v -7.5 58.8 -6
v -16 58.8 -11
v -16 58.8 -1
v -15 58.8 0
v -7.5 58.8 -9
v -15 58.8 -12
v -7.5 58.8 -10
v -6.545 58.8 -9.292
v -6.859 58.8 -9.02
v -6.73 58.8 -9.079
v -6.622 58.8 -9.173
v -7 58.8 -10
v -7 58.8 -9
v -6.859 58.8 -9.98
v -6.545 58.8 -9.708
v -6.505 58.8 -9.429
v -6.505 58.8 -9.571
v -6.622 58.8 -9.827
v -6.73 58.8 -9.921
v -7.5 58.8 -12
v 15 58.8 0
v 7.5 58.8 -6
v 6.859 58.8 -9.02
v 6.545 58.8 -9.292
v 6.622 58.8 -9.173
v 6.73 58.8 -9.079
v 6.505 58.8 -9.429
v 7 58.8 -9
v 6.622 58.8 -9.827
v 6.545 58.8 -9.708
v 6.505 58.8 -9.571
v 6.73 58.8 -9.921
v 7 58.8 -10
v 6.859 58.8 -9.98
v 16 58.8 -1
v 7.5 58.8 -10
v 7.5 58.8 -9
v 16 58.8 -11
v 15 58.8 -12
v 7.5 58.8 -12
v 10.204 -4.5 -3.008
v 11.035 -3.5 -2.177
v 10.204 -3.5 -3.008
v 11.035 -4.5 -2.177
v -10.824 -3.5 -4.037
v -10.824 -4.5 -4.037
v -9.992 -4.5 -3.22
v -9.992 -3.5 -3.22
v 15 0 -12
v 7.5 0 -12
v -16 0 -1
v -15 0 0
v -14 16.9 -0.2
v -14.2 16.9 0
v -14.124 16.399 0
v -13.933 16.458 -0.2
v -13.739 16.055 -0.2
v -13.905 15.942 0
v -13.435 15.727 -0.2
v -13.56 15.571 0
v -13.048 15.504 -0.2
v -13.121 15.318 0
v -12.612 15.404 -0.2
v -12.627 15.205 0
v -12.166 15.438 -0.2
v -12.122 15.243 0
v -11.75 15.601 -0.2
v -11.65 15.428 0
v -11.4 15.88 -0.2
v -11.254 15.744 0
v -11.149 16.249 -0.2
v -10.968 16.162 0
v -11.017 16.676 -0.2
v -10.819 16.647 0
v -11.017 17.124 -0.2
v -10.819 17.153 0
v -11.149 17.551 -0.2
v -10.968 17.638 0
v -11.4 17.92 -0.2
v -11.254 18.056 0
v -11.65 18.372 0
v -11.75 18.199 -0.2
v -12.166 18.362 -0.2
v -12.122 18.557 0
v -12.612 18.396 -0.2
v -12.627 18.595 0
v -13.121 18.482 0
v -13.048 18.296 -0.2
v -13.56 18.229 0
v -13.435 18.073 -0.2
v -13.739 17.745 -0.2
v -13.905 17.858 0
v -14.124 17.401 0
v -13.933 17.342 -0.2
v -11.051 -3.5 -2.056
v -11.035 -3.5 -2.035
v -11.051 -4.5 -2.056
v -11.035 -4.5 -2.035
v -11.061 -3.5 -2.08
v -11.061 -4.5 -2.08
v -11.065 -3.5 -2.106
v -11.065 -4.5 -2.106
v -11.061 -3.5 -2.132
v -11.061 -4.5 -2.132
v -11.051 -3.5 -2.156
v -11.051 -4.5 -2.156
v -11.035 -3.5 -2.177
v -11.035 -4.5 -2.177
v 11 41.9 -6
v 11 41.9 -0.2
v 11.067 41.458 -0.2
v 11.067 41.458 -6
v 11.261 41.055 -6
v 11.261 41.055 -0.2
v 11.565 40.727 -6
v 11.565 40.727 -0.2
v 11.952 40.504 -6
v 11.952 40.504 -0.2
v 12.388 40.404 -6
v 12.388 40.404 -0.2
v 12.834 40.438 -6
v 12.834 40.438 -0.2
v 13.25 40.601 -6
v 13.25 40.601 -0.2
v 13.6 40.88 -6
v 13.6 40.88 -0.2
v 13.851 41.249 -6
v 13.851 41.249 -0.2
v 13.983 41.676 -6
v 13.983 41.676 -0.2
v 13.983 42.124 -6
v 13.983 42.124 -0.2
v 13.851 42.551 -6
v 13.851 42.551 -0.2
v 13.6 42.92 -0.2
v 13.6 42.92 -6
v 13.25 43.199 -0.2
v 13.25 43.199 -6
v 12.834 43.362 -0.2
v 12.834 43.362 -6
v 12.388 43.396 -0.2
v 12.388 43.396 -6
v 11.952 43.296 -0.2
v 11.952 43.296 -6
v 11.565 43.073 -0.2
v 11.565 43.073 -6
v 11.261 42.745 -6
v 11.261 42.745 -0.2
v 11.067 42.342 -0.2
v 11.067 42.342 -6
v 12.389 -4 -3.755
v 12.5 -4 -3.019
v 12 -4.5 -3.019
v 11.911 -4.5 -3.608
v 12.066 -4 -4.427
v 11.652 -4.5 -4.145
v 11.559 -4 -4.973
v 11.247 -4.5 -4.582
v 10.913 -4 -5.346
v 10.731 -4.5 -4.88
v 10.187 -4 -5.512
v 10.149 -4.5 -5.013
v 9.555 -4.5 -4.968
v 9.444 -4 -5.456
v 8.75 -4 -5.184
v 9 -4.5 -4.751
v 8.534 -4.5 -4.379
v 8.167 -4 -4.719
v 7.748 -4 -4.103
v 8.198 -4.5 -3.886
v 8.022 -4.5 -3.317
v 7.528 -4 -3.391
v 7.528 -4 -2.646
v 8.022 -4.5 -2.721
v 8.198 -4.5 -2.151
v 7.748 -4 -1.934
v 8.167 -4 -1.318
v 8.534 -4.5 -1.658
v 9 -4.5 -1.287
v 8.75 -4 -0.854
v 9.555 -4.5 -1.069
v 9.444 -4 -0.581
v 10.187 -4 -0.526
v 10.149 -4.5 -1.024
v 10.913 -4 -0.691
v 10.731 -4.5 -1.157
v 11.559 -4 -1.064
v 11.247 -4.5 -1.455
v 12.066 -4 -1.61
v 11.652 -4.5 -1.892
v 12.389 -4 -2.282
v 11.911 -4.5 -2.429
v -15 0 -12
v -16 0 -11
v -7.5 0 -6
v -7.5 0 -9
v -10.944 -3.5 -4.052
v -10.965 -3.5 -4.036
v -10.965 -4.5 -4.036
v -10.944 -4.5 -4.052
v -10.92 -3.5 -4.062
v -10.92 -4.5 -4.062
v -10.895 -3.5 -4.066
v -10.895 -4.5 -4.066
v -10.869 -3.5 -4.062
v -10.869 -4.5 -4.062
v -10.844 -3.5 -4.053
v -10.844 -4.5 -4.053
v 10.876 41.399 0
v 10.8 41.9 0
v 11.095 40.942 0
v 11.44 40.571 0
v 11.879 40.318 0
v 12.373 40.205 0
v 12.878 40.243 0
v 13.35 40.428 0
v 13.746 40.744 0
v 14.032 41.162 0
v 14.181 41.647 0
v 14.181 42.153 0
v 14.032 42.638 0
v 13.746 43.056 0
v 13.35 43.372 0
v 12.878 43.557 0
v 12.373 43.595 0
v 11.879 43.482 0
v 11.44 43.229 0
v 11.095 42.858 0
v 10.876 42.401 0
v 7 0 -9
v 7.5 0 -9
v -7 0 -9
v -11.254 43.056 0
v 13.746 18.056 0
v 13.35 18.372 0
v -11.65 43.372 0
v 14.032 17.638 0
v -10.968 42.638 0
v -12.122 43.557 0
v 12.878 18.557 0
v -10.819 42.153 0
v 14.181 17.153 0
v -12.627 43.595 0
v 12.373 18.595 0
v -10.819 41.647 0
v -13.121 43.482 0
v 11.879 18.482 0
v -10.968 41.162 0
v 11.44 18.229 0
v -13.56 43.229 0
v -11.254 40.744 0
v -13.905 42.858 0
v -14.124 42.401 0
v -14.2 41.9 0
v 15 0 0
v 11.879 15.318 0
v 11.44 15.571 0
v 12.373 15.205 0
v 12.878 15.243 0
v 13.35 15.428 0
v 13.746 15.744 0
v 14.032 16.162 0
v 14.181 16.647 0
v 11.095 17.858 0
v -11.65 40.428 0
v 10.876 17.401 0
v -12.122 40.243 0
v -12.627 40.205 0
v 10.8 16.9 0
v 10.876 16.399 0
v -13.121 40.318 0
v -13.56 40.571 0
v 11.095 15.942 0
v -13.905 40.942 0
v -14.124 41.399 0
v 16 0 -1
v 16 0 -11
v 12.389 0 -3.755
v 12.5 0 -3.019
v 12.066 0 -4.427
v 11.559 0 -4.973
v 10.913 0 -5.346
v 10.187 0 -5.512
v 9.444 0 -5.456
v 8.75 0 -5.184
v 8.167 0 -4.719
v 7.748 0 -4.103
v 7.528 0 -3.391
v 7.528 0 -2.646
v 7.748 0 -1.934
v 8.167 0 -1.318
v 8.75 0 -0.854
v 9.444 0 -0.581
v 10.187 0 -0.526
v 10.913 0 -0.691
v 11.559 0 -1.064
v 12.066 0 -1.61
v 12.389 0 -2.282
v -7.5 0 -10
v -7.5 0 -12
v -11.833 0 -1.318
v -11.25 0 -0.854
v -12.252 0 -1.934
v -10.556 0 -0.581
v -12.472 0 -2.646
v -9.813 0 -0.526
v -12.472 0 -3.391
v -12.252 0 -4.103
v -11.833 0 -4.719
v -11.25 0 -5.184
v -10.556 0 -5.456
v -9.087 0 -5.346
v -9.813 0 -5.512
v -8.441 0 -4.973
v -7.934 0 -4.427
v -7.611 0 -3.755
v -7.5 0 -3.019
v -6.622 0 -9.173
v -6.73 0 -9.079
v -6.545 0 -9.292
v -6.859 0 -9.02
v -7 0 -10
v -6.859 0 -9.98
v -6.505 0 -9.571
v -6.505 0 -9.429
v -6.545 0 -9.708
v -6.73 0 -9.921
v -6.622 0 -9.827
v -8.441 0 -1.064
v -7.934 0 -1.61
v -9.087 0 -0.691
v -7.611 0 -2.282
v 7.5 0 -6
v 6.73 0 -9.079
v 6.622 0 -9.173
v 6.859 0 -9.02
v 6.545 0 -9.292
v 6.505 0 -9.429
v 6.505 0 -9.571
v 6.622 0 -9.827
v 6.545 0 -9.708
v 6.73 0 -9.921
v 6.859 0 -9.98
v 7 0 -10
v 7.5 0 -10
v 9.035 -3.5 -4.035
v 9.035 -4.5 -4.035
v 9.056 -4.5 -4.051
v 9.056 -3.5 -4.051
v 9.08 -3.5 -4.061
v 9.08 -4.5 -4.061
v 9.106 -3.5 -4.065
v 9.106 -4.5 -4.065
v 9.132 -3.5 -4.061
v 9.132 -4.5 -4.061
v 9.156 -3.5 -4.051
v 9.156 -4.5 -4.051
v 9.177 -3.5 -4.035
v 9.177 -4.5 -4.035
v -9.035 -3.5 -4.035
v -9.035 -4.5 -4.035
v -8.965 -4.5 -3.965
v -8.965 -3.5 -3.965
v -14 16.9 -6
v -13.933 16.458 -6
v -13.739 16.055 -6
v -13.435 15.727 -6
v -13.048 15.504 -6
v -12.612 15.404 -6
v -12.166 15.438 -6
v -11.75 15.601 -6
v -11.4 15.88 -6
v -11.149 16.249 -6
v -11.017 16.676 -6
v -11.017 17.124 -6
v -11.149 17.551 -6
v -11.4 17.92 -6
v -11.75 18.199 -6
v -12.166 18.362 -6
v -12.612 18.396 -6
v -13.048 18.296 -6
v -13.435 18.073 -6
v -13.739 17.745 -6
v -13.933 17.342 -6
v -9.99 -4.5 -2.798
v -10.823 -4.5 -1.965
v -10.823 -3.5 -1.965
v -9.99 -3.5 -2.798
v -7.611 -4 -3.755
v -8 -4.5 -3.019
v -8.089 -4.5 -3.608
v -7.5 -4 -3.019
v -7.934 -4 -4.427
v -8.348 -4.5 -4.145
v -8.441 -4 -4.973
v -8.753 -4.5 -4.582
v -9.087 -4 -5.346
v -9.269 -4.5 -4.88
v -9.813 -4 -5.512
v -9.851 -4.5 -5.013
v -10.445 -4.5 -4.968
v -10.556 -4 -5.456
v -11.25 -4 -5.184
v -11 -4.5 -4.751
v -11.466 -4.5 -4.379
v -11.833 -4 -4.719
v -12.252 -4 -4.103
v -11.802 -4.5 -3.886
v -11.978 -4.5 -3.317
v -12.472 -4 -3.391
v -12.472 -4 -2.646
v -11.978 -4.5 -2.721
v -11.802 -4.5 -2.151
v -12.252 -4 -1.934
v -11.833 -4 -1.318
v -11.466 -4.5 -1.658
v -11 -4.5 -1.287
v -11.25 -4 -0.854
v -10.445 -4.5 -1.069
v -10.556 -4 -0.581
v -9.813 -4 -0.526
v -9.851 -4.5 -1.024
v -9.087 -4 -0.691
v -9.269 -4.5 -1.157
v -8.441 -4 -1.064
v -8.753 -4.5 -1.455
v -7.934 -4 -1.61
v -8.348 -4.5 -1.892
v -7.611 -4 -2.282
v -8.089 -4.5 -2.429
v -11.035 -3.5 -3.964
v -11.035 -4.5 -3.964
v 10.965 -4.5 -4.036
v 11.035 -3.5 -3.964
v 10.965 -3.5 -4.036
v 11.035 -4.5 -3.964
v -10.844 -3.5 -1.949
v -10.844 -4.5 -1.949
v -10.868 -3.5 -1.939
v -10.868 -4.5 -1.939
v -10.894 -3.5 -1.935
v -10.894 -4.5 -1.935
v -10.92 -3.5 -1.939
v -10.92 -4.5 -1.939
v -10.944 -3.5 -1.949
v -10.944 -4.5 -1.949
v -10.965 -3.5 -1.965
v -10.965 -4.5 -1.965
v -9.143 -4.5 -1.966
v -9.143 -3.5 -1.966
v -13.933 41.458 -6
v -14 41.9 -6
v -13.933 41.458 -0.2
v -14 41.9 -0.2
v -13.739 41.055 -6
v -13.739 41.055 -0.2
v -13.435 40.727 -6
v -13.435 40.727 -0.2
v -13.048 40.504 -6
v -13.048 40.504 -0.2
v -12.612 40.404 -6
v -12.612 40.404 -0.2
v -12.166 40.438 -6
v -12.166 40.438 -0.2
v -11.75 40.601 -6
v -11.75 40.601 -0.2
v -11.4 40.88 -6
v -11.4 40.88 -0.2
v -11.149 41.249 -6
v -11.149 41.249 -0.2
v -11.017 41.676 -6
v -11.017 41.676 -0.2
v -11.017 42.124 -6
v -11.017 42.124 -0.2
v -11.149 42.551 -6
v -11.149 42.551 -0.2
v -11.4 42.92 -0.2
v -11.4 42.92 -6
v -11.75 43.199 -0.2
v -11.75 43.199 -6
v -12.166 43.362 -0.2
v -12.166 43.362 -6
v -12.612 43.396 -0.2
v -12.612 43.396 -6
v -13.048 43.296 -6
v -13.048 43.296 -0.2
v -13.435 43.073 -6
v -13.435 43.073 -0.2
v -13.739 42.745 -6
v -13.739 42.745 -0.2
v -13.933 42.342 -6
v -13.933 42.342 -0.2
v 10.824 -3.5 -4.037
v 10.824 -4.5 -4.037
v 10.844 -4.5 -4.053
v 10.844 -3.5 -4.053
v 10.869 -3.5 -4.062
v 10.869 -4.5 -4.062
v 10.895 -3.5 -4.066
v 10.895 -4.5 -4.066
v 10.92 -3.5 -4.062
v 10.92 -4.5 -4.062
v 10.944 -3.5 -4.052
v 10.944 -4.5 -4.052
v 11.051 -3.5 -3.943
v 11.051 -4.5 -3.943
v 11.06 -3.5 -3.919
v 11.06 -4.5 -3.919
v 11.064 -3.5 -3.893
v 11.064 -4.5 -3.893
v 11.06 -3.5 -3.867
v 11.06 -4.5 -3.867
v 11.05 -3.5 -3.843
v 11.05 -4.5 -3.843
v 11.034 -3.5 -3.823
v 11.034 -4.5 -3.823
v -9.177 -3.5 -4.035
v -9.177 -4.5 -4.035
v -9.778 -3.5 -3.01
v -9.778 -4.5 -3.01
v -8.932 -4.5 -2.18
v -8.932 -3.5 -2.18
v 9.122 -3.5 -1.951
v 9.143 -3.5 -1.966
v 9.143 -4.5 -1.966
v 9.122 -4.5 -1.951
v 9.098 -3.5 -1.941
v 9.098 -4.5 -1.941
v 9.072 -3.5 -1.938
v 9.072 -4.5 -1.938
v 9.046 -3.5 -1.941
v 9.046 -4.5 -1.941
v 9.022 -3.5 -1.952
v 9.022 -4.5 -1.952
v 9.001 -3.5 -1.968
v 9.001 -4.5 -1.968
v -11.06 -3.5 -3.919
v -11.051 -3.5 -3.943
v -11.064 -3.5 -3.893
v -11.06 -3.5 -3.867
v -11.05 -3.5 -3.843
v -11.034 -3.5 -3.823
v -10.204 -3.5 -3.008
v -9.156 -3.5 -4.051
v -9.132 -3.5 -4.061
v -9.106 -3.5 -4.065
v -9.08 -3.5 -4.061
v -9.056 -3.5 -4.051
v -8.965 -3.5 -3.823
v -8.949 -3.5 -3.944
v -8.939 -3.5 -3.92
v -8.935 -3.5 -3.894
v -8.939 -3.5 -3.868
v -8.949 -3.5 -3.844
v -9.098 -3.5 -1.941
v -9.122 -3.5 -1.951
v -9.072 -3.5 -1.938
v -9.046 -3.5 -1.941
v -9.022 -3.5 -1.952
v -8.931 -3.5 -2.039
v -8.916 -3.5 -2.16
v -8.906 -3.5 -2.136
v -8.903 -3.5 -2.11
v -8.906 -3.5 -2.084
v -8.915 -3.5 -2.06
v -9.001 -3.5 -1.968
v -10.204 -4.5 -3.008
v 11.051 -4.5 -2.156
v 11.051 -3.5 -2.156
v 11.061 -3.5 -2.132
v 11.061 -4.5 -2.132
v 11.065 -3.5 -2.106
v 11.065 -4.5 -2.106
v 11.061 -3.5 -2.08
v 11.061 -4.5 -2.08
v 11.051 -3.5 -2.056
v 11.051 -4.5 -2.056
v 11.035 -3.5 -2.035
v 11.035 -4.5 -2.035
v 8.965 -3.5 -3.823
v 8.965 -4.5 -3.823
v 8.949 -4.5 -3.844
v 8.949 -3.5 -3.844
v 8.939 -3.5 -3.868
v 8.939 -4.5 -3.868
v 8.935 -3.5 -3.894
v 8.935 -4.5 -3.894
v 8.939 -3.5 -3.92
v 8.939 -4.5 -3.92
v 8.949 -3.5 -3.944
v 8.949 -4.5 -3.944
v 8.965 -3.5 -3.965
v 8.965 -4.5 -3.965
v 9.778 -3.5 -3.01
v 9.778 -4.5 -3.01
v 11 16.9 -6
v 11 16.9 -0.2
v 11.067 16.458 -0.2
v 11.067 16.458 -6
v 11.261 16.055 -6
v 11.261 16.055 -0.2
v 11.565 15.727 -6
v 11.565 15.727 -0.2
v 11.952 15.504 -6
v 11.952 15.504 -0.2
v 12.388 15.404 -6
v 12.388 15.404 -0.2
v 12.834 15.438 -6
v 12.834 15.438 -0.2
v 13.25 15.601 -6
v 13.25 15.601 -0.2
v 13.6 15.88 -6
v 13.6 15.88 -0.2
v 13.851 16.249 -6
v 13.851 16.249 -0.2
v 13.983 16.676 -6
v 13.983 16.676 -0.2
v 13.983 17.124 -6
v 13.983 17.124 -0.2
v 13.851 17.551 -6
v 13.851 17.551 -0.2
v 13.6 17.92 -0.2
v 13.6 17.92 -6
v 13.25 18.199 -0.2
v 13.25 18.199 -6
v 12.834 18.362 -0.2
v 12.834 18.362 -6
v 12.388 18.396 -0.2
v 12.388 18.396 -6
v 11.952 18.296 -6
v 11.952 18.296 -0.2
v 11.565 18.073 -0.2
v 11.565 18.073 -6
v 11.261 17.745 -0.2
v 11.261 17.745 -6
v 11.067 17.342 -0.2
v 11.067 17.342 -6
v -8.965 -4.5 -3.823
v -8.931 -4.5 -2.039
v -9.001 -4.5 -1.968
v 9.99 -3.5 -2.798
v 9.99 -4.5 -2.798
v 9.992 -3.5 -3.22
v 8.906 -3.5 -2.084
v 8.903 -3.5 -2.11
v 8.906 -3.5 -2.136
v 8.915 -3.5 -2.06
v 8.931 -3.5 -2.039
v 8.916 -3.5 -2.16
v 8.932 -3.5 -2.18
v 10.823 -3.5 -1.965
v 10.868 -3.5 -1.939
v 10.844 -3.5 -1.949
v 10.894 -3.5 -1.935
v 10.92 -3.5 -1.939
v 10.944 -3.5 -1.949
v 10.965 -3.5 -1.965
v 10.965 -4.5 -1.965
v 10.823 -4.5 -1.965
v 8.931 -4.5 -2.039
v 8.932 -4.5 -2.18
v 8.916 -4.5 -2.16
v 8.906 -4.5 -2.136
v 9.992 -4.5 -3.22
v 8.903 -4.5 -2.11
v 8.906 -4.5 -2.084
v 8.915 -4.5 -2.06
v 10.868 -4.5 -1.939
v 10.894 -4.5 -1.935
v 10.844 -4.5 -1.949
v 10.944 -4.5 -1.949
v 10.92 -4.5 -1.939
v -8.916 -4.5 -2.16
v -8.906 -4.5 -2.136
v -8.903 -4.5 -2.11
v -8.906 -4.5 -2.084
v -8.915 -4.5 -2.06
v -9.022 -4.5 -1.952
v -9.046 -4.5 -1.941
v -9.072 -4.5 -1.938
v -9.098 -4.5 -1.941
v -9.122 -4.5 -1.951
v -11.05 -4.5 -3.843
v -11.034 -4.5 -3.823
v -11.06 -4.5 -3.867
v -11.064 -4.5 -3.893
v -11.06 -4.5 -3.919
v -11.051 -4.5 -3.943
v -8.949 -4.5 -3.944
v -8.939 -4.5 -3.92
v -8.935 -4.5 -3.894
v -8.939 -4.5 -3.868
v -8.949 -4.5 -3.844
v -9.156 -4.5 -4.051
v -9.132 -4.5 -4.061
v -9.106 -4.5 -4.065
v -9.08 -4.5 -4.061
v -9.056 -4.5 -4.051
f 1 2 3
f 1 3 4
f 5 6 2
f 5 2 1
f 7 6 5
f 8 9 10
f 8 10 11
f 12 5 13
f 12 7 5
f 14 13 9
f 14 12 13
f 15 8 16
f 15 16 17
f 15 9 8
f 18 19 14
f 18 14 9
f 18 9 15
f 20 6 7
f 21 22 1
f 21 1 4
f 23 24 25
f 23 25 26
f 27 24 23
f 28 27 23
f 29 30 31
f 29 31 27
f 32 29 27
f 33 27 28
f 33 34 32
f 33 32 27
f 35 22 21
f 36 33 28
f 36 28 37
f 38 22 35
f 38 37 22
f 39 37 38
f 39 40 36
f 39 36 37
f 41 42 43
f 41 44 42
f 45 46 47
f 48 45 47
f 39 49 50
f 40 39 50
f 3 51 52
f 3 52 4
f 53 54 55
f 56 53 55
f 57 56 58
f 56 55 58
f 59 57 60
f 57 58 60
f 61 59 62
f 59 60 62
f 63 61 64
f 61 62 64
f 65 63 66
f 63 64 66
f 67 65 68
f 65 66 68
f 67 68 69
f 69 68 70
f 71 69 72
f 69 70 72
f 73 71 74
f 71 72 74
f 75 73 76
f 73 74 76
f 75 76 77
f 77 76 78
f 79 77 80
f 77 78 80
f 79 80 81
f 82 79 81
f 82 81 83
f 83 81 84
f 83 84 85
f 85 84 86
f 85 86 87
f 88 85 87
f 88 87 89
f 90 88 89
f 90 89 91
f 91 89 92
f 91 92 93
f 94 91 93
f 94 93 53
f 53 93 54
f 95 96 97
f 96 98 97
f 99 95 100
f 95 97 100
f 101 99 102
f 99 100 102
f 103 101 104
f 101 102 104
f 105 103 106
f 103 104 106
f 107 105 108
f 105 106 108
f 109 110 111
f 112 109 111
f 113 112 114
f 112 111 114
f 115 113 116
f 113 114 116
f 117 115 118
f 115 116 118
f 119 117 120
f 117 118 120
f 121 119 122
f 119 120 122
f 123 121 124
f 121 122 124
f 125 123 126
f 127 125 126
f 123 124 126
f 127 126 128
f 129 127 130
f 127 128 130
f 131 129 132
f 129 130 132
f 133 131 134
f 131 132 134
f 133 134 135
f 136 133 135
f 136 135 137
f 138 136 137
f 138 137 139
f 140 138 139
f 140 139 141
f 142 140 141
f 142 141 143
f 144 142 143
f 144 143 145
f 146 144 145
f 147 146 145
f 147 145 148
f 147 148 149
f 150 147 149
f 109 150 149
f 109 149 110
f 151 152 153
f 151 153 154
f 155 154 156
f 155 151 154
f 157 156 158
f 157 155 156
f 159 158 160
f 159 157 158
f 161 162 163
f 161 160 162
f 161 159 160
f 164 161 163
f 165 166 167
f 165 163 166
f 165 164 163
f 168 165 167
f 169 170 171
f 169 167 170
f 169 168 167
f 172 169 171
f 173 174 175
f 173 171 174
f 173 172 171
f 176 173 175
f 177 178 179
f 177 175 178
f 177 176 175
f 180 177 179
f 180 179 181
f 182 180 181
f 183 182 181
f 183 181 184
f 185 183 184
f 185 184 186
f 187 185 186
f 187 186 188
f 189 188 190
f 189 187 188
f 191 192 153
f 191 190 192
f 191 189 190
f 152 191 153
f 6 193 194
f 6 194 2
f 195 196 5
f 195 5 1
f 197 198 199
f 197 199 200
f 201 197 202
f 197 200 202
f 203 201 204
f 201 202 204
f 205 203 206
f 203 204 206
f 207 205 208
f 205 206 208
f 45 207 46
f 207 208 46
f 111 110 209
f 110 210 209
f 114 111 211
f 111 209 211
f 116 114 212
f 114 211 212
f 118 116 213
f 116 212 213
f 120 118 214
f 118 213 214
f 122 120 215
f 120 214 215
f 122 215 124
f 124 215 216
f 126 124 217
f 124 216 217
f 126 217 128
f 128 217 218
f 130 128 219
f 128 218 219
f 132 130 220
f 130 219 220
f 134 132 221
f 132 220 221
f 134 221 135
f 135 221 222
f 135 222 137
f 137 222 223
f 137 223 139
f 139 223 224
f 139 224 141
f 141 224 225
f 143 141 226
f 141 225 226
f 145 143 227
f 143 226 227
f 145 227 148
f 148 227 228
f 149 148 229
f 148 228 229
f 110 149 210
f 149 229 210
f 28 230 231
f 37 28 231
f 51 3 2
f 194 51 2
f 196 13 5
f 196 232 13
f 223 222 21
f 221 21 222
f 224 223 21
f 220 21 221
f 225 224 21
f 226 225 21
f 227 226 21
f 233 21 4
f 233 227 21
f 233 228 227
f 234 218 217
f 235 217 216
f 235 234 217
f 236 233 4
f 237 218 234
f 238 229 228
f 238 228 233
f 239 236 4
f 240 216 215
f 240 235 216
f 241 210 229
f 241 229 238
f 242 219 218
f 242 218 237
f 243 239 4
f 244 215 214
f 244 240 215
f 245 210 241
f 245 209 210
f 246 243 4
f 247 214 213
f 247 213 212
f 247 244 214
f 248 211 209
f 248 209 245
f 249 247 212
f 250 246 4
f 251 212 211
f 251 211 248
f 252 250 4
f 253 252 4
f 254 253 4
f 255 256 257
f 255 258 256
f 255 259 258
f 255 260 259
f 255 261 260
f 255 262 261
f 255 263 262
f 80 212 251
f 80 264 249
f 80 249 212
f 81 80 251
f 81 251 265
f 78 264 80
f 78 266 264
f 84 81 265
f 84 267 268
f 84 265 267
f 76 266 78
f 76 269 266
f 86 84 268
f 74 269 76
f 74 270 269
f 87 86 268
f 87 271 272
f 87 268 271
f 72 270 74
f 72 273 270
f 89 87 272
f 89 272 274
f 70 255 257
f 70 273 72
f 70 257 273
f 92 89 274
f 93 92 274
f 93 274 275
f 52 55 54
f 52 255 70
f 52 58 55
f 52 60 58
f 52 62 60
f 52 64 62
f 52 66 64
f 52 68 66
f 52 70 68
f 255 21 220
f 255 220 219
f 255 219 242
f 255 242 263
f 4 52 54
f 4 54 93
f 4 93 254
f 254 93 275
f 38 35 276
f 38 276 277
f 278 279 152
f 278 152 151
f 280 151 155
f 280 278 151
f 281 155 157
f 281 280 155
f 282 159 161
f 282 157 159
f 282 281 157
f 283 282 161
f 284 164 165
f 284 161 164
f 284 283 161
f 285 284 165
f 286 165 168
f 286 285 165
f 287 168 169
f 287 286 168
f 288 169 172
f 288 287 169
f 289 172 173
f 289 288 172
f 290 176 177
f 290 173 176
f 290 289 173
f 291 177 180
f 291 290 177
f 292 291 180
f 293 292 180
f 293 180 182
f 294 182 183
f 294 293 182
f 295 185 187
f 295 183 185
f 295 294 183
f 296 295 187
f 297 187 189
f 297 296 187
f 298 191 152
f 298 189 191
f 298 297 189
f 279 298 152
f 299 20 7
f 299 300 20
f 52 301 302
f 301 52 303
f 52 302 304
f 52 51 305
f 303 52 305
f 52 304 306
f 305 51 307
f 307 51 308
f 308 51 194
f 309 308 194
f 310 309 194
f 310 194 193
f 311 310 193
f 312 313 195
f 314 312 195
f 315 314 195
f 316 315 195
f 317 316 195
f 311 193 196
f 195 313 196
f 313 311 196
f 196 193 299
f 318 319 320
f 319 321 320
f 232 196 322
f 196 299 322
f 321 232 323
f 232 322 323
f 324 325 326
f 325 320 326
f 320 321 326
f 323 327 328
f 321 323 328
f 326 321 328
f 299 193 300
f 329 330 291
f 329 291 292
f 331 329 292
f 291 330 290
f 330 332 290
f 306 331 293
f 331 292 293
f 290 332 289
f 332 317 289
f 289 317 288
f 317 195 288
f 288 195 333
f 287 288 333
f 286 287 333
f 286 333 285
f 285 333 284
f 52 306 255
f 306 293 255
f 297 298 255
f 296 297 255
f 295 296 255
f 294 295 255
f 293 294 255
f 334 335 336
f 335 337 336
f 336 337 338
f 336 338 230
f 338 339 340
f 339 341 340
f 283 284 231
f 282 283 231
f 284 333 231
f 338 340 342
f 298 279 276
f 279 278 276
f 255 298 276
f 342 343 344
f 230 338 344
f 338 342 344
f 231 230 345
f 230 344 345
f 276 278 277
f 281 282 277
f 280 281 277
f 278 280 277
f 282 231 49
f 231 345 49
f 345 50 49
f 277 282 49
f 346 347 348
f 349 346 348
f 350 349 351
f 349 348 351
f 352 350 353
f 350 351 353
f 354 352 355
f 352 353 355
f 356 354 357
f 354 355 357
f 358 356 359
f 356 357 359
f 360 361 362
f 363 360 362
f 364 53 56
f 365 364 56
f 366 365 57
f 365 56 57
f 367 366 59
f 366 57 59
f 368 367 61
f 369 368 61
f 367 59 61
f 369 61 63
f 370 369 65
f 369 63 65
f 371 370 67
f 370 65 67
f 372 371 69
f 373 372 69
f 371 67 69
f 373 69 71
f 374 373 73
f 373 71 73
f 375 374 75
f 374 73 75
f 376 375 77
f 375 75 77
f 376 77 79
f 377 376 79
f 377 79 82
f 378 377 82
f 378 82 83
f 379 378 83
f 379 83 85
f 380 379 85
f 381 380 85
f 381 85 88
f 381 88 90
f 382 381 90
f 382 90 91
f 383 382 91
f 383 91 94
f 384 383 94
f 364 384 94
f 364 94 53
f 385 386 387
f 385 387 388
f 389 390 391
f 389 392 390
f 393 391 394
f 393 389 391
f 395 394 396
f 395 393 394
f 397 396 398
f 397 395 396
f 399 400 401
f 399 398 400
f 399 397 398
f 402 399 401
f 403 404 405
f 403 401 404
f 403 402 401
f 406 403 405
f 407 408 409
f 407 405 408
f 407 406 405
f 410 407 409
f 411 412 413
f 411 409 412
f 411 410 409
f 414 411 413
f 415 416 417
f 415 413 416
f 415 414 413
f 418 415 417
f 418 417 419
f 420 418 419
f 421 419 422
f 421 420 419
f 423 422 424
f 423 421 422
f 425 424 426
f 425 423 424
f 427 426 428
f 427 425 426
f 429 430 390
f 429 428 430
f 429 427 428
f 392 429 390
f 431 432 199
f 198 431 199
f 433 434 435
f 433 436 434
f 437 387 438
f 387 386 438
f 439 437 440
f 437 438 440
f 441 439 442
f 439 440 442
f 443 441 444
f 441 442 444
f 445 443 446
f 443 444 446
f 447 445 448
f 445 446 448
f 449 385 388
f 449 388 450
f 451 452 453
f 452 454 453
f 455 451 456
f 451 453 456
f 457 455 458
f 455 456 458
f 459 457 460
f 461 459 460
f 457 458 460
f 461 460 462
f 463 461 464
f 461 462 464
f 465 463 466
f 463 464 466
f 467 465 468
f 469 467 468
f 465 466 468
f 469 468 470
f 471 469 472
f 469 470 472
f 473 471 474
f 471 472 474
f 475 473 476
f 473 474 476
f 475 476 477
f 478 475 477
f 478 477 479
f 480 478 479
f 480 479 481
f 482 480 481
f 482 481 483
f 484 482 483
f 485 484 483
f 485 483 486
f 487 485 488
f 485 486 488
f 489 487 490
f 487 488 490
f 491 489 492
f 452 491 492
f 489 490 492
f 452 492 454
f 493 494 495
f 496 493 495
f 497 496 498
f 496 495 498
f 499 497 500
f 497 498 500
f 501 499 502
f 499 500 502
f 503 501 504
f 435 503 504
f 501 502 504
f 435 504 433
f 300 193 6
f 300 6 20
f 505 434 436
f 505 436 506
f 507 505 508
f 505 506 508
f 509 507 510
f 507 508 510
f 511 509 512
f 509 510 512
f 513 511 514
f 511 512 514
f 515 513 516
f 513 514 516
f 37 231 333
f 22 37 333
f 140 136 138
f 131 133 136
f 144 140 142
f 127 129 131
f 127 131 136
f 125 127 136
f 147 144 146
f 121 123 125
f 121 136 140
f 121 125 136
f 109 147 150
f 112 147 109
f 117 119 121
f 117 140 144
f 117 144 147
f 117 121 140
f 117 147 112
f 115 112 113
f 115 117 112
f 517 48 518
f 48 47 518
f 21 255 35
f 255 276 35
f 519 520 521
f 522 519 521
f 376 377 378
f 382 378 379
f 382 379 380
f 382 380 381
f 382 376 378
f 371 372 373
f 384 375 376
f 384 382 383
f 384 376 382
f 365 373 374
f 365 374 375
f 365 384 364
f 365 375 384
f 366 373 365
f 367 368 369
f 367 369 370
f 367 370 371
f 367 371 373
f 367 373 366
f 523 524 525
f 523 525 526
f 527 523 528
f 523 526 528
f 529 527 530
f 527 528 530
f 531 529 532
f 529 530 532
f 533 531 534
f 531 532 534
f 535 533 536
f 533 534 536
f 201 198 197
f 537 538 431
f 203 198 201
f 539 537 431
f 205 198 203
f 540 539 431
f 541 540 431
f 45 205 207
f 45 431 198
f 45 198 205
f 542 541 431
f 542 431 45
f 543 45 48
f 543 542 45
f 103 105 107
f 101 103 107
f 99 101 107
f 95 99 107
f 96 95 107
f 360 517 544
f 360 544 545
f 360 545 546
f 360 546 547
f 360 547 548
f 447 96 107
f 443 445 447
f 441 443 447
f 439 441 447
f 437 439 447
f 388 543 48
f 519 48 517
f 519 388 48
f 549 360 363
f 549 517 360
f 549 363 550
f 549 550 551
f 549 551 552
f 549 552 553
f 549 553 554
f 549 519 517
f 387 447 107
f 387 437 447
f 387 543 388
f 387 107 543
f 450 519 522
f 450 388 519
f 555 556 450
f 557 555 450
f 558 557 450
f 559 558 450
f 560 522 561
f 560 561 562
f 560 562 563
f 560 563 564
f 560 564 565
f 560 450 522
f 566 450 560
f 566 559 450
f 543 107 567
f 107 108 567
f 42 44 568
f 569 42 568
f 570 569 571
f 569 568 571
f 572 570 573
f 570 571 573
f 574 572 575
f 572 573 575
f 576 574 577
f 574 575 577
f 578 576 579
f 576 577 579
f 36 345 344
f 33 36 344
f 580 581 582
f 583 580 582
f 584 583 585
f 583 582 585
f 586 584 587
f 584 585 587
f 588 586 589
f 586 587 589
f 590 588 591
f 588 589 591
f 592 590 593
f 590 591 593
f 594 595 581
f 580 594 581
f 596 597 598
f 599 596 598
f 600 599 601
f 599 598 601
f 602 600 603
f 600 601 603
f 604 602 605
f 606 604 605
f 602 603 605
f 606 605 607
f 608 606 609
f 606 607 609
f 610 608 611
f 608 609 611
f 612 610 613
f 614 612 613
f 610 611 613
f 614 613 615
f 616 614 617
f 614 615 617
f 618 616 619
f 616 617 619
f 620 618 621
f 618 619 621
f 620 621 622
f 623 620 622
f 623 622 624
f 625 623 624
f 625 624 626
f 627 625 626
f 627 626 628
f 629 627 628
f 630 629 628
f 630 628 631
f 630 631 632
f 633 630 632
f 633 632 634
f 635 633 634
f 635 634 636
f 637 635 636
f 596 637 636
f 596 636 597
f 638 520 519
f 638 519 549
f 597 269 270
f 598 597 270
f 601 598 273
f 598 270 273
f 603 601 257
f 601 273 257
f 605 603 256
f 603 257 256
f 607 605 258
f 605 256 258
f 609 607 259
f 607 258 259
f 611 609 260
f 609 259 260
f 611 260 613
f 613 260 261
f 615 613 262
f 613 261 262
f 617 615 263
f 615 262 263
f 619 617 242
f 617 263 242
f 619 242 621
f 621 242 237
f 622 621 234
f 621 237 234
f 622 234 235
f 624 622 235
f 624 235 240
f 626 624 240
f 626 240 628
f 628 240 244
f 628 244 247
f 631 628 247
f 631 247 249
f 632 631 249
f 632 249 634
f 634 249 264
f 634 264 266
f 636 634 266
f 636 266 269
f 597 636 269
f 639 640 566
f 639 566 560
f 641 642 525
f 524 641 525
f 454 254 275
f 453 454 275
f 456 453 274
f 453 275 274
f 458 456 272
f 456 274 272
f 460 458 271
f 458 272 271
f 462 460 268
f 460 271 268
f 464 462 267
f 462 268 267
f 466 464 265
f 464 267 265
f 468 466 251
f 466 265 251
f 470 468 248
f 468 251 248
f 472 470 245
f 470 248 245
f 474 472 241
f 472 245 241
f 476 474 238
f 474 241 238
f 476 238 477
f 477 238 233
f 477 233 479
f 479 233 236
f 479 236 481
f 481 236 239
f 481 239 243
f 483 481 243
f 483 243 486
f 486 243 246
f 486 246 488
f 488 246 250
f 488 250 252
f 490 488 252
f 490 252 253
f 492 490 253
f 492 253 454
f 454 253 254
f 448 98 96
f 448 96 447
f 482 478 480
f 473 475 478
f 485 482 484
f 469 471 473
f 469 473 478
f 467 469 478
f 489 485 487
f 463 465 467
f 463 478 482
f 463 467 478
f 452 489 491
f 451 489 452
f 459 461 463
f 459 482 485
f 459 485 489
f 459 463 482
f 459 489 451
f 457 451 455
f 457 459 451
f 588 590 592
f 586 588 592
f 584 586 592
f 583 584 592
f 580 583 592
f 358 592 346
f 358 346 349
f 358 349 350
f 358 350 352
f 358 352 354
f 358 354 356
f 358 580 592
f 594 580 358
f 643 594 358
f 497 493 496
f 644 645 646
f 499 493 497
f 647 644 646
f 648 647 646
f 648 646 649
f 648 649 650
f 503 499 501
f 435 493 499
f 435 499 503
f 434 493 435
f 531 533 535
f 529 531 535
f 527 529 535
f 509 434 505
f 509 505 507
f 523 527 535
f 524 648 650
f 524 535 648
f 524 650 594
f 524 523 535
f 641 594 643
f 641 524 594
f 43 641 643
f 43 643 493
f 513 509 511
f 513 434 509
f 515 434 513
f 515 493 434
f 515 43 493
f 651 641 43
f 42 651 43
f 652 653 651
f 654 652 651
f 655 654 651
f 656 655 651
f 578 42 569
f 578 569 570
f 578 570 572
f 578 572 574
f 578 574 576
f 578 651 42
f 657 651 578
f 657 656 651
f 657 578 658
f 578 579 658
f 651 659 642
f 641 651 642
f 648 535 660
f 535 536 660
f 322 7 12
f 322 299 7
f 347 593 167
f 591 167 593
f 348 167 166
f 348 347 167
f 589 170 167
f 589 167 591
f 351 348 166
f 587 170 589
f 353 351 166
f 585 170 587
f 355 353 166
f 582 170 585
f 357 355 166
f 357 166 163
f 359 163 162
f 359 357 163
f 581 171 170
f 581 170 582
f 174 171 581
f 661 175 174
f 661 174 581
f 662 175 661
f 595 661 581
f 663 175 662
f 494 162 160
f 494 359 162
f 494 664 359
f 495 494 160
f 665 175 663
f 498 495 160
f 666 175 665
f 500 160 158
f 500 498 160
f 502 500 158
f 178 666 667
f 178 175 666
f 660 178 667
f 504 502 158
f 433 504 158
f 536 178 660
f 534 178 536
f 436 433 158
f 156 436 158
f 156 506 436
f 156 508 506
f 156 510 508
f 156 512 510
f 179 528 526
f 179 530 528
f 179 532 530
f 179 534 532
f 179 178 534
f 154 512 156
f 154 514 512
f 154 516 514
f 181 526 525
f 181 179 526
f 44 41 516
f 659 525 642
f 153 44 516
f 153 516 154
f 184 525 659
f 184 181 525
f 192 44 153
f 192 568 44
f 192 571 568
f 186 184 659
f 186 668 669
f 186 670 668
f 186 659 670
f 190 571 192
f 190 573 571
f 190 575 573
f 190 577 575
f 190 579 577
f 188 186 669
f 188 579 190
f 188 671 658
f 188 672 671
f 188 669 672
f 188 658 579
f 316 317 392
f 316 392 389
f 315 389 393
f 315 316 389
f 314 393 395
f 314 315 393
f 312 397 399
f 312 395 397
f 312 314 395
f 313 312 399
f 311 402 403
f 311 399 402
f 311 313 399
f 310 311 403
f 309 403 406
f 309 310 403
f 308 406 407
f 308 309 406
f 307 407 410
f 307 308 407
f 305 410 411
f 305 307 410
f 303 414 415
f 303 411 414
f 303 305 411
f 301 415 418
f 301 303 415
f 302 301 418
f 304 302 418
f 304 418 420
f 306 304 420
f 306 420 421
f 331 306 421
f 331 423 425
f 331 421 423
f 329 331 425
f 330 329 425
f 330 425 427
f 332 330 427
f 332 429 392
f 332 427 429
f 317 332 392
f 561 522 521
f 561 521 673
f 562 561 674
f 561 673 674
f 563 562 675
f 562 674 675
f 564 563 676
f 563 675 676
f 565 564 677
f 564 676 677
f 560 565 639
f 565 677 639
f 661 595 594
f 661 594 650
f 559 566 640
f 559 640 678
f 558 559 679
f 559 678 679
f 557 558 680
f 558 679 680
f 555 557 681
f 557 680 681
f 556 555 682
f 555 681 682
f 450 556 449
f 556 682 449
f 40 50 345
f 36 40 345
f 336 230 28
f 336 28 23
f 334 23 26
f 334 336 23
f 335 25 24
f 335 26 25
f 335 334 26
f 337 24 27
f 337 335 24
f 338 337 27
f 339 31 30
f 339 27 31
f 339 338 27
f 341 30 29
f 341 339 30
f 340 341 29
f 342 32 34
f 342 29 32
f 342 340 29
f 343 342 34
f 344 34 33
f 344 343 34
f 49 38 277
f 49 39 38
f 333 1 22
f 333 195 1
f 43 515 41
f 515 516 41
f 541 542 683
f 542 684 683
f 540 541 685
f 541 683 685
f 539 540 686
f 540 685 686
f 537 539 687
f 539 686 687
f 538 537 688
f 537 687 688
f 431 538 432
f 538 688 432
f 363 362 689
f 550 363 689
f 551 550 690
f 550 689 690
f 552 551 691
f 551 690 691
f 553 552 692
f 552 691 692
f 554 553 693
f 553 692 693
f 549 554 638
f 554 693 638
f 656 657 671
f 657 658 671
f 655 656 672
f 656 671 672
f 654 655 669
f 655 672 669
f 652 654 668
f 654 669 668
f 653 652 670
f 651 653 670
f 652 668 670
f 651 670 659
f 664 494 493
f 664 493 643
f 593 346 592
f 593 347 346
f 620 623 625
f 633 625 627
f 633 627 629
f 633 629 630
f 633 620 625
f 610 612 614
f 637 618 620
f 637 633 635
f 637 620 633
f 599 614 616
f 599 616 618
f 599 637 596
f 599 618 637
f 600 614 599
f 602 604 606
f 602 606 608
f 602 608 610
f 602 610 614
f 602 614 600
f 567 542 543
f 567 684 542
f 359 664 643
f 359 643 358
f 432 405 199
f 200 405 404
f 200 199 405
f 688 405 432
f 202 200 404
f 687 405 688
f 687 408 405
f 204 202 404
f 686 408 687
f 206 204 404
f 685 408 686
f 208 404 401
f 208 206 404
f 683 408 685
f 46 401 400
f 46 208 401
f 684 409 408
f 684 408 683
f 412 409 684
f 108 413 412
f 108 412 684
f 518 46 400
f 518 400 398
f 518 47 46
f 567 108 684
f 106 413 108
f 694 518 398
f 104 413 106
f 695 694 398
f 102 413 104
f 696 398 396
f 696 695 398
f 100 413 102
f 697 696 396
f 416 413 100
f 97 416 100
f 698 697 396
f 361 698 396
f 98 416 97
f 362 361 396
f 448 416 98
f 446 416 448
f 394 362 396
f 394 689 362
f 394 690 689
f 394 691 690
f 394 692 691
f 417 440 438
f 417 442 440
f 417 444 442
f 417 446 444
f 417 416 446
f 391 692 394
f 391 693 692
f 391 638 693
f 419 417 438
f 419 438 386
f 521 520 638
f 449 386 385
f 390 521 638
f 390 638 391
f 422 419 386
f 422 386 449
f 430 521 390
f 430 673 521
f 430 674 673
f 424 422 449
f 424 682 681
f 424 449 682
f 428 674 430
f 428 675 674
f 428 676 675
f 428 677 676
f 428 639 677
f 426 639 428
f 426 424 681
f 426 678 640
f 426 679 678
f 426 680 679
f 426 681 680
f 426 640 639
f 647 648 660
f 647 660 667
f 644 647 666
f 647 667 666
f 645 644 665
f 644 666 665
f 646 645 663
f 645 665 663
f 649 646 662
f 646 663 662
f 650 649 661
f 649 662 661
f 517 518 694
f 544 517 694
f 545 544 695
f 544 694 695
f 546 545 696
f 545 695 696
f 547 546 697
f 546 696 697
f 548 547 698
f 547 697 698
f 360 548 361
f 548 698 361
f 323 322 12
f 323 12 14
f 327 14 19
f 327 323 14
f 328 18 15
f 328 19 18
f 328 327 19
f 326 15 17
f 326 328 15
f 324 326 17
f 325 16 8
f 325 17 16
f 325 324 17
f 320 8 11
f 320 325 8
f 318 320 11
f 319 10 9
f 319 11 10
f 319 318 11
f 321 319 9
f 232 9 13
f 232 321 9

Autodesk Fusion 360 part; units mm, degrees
sketch "Sketch1" plane through (0, 0, 0) normal (0, 1, 0) x (1, 0, 0)
  line L0 (0, 0) -> (16, 0)
  line L1 (16, 0) -> (16, 12)
  line L2 (16, 12) -> (7.5, 12)
  line L3 (7.5, 6) -> (0, 6)
  line L4 (7.5, 12) -> (7.5, 10)
  line L5 (7.5, 10) -> (7, 10)
  line L6 (6.5, 9.5) -> (6.5, 9.5)
  line L7 (7, 9) -> (7.5, 9)
  line L8 (7.5, 9) -> (7.5, 6)
  arc A0 (6.5, 9.5) -> (7, 9) centre (7, 9.5) ccw
  arc A1 (7, 10) -> (6.5, 9.5) centre (7, 9.5) ccw
  line L9 (-7, 9) -> (-7.5, 9)
  line L10 (-7.5, 10) -> (-7, 10)
  arc A2 (-6.5, 9.5) -> (-7, 10) centre (-7, 9.5) ccw
  arc A3 (-7, 9) -> (-6.5, 9.5) centre (-7, 9.5) ccw
  line L11 (-16, 12) -> (-7.5, 12)
  line L12 (-16, 0) -> (-16, 12)
  line L13 (-6.5, 9.5) -> (-6.5, 9.5)
  line L14 (0, 0) -> (-16, 0)
  line L15 (-7.5, 6) -> (0, 6)
  line L16 (-7.5, 12) -> (-7.5, 10)
  line L17 (-7.5, 9) -> (-7.5, 6)
  point P0 (6.5, 10)
  point P1 (6.5, 9)
  point P2 (-6.5, 9)
  point P3 (-6.5, 10)
  dimension "d1" = 16
  dimension "d2" = 12
  dimension "d3" = 8.5
  dimension "d4" = 6
  dimension "d5" = 7.5
  dimension "d6" = 1
  dimension "d7" = 1
  dimension "d8" = 1
  dimension "d9" = 0.5
  dimension "d10" = 0.5
extrude "Extrude1" add sketch "Sketch1" along normal blind 58.8
sketch "Sketch2" plane through (0, 0, 0) normal (0, 0, 1) x (-1, 0, 0)
  line L0 (16, 0) -> (-16, 0)
  line L1 (-16, 0) -> (-16, -58.8)
  line L2 (-16, -58.8) -> (16, -58.8)
  line L3 (16, -58.8) -> (16, 0)
  line L4 (0, -29.4) -> (-12.5, -29.4)
  line L5 (-12.5, -29.4) -> (-12.5, -41.9)
  line L6 (-12.5, -41.9) -> (0, -41.9)
  line L7 (0, -41.9) -> (0, -29.4)
  circle A0 centre (-12.5, -41.9) radius 1.5
  circle A1 centre (12.5, -41.9) radius 1.5
  circle A2 centre (12.5, -16.9) radius 1.5
  circle A3 centre (-12.5, -16.9) radius 1.5
  dimension "d13" = 12.5
  dimension "d14" = 12.5
  dimension "d15" = 3
extrude "Extrude2" cut sketch "Sketch2" against normal blind 6 contours L5 L6 A0 | L5 L6 A0 | A1 | A2 | A3
chamfer "Chamfer1" distance 1 angle 45 4 edges at (-16, 29.4, 0) (-16, 29.4, -12) (16, 29.4, 0) (16, 29.4, -12)
chamfer "Chamfer2" distance 0.2 angle 45 4 edges at (-11.1015, 41.3576, 0) (13.8985, 41.3576, 0) (13.8985, 16.3576, 0) (-11.1015, 16.3576, 0)
sketch "Sketch3" plane through (0, 0, 0) normal (0, -1, 0) x (1, 0, 0)
  line L0 (15, -12) -> (16, -11)
  line L1 (16, -11) -> (16, -1)
  line L2 (16, -1) -> (15, 0)
  line L3 (15, 0) -> (-15, 0)
  line L4 (-15, 0) -> (-16, -1)
  line L5 (-16, -1) -> (-16, -11)
  line L6 (-16, -11) -> (-15, -12)
  line L7 (-15, -12) -> (-7.5, -12)
  line L8 (-7.5, -12) -> (-7.5, -10)
  line L9 (-7.5, -10) -> (-7, -10)
  arc A0 (-7, -10) -> (-7, -9) centre (-7, -9.5) ccw
  line L10 (-7, -9) -> (-7.5, -9)
  line L11 (-7.5, -9) -> (-7.5, -6)
  line L12 (-7.5, -6) -> (7.5, -6)
  line L13 (7.5, -6) -> (7.5, -9)
  line L14 (7.5, -9) -> (7, -9)
  arc A1 (7, -9) -> (7, -10) centre (7, -9.5) ccw
  line L15 (7, -10) -> (7.5, -10)
  line L16 (7.5, -10) -> (7.5, -12)
  line L17 (7.5, -12) -> (15, -12)
  circle A2 centre (-10, -3.0186) radius 2.5
  circle A3 centre (10, -3.0186) radius 2.5
  dimension "d22" = 5
extrude "Extrude3" add sketch "Sketch3" along normal blind 4.5 contours A2 | A3
chamfer "Chamfer3" distance 0.5 angle 45 2 edges at (-12.3308, -4.5, -3.9226) (7.6692, -4.5, -3.9226)
sketch "Sketch4" plane through (0, -4.5, 0) normal (0, -1, 0) x (1, 0, 0)
  circle A0 centre (-10, -3.0186) radius 2
  line L0 (-11.0354, -2.0354) -> (-10.9646, -1.9646)
  line L1 (-9.0012, -1.9676) -> (-8.9312, -2.039)
  line L2 (-11.035, -3.9643) -> (-10.965, -4.0357)
  line L3 (-9.0354, -4.0354) -> (-8.9646, -3.9646)
  line L4 (-11.0337, -3.8229) -> (-10.2039, -3.0082)
  line L5 (-9.9898, -2.7981) -> (-9.1426, -1.9663)
  line L6 (-10.8232, -1.9646) -> (-9.9898, -2.7981)
  line L7 (-9.7777, -3.0102) -> (-8.9646, -3.8232)
  line L8 (-10.8236, -4.037) -> (-9.9918, -3.2204)
  line L9 (-9.7777, -3.0102) -> (-8.9325, -2.1804)
  line L10 (-11.0354, -2.1768) -> (-10.2039, -3.0082)
  line L11 (-9.9918, -3.2204) -> (-9.1768, -4.0354)
  arc A1 (-11.0354, -2.0354) -> (-11.0354, -2.1768) centre (-10.9646, -2.1061) ccw
  arc A2 (-10.8232, -1.9646) -> (-10.9646, -1.9646) centre (-10.8939, -2.0354) ccw
  arc A3 (-9.0012, -1.9676) -> (-9.1426, -1.9663) centre (-9.0726, -2.0377) ccw
  arc A4 (-8.9325, -2.1804) -> (-8.9312, -2.039) centre (-9.0025, -2.109) ccw
  arc A5 (-8.9646, -3.9646) -> (-8.9646, -3.8232) centre (-9.0354, -3.8939) ccw
  arc A6 (-9.1768, -4.0354) -> (-9.0354, -4.0354) centre (-9.1061, -3.9646) ccw
  arc A7 (-10.965, -4.0357) -> (-10.8236, -4.037) centre (-10.8936, -3.9656) ccw
  arc A8 (-11.0337, -3.8229) -> (-11.035, -3.9643) centre (-10.9637, -3.8943) ccw
  arc A9 (11.0354, -2.1768) -> (11.0354, -2.0354) centre (10.9646, -2.1061) ccw
  line L12 (11.035, -3.9643) -> (10.965, -4.0357)
  line L13 (9.7777, -3.0102) -> (8.9325, -2.1804)
  line L14 (11.0354, -2.0354) -> (10.9646, -1.9646)
  line L15 (9.9898, -2.7981) -> (9.1426, -1.9663)
  arc A10 (8.9646, -3.8232) -> (8.9646, -3.9646) centre (9.0354, -3.8939) ccw
  arc A11 (8.9312, -2.039) -> (8.9325, -2.1804) centre (9.0025, -2.109) ccw
  line L16 (9.9918, -3.2204) -> (9.1768, -4.0354)
  arc A12 (10.8236, -4.037) -> (10.965, -4.0357) centre (10.8936, -3.9656) ccw
  arc A13 (9.0354, -4.0354) -> (9.1768, -4.0354) centre (9.1061, -3.9646) ccw
  arc A14 (11.035, -3.9643) -> (11.0337, -3.8229) centre (10.9637, -3.8943) ccw
  line L17 (10.8236, -4.037) -> (9.9918, -3.2204)
  arc A15 (9.1426, -1.9663) -> (9.0012, -1.9676) centre (9.0726, -2.0377) ccw
  line L18 (10.8232, -1.9646) -> (9.9898, -2.7981)
  arc A16 (10.9646, -1.9646) -> (10.8232, -1.9646) centre (10.8939, -2.0354) ccw
  line L19 (11.0354, -2.1768) -> (10.2039, -3.0082)
  line L20 (9.0012, -1.9676) -> (8.9312, -2.039)
  line L21 (11.0337, -3.8229) -> (10.2039, -3.0082)
  line L22 (9.7777, -3.0102) -> (8.9646, -3.8232)
  line L23 (9.0354, -4.0354) -> (8.9646, -3.9646)
  point P0 (10, -3.0186)
  dimension "d30" = 0.1
  dimension "d31" = 0.1
extrude "Extrude4" cut sketch "Sketch4" against normal blind 1 contours L0 L1 L2 L3 L4 L5 L6 L7 L8 L9 L10 L11 A1 A2 A3 A4 A5 A6 A7 A8 | A9 L12 L13 L14 L15 A10 A11 L16 A12 A13 A14 L17 A15 L18 A16 L19 L20 L21 L22 L23
